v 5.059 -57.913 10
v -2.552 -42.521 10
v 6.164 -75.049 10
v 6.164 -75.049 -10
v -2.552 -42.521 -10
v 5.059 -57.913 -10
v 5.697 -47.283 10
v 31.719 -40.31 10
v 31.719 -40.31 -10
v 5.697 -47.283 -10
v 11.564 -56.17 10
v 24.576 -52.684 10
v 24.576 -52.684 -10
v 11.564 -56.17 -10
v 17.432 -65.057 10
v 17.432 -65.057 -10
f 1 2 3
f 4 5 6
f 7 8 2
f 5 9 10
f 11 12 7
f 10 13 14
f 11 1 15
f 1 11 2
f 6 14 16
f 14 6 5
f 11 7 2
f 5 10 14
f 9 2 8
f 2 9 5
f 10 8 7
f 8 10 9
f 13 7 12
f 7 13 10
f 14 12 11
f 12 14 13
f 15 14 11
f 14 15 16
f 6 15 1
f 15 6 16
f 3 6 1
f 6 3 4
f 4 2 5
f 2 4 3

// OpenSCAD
polyhedron(
    points=[
    [-2.55221605790644, -42.5205678841871, 10],
    [31.7194598552339, -40.3102839420935, 10],
    [5.69667591314034, -47.2830678841871, 10],
    [24.5757098552339, -52.6836218986637, 10],
    [11.5643178841871, -56.1700138697105, 10],
    [17.4319598552339, -65.0569598552339, 10],
    [5.05862189866373, -57.9132098552339, 10],
    [6.16376386971051, -75.0490478118041, 10],
    [-2.55221605790644, -42.5205678841871, -10],
    [31.7194598552339, -40.3102839420935, -10],
    [5.69667591314034, -47.2830678841871, -10],
    [24.5757098552339, -52.6836218986637, -10],
    [11.5643178841871, -56.1700138697105, -10],
    [17.4319598552339, -65.0569598552339, -10],
    [5.05862189866373, -57.9132098552339, -10],
    [6.16376386971051, -75.0490478118041, -10],
    ],
    faces=[
        [7,0,6],
        [14,8,15],
        [0,1,2],
        [10,9,8],
        [2,3,4],
        [12,11,10],
        [6,0,4,5],
        [13,12,8,14],
        [0,2,4],
        [12,10,8],
        [0,8,9,1],
        [1,9,10,2],
        [2,10,11,3],
        [3,11,12,4],
        [4,12,13,5],
        [5,13,14,6],
        [6,14,15,7],
        [7,15,8,0],
    ]
);
